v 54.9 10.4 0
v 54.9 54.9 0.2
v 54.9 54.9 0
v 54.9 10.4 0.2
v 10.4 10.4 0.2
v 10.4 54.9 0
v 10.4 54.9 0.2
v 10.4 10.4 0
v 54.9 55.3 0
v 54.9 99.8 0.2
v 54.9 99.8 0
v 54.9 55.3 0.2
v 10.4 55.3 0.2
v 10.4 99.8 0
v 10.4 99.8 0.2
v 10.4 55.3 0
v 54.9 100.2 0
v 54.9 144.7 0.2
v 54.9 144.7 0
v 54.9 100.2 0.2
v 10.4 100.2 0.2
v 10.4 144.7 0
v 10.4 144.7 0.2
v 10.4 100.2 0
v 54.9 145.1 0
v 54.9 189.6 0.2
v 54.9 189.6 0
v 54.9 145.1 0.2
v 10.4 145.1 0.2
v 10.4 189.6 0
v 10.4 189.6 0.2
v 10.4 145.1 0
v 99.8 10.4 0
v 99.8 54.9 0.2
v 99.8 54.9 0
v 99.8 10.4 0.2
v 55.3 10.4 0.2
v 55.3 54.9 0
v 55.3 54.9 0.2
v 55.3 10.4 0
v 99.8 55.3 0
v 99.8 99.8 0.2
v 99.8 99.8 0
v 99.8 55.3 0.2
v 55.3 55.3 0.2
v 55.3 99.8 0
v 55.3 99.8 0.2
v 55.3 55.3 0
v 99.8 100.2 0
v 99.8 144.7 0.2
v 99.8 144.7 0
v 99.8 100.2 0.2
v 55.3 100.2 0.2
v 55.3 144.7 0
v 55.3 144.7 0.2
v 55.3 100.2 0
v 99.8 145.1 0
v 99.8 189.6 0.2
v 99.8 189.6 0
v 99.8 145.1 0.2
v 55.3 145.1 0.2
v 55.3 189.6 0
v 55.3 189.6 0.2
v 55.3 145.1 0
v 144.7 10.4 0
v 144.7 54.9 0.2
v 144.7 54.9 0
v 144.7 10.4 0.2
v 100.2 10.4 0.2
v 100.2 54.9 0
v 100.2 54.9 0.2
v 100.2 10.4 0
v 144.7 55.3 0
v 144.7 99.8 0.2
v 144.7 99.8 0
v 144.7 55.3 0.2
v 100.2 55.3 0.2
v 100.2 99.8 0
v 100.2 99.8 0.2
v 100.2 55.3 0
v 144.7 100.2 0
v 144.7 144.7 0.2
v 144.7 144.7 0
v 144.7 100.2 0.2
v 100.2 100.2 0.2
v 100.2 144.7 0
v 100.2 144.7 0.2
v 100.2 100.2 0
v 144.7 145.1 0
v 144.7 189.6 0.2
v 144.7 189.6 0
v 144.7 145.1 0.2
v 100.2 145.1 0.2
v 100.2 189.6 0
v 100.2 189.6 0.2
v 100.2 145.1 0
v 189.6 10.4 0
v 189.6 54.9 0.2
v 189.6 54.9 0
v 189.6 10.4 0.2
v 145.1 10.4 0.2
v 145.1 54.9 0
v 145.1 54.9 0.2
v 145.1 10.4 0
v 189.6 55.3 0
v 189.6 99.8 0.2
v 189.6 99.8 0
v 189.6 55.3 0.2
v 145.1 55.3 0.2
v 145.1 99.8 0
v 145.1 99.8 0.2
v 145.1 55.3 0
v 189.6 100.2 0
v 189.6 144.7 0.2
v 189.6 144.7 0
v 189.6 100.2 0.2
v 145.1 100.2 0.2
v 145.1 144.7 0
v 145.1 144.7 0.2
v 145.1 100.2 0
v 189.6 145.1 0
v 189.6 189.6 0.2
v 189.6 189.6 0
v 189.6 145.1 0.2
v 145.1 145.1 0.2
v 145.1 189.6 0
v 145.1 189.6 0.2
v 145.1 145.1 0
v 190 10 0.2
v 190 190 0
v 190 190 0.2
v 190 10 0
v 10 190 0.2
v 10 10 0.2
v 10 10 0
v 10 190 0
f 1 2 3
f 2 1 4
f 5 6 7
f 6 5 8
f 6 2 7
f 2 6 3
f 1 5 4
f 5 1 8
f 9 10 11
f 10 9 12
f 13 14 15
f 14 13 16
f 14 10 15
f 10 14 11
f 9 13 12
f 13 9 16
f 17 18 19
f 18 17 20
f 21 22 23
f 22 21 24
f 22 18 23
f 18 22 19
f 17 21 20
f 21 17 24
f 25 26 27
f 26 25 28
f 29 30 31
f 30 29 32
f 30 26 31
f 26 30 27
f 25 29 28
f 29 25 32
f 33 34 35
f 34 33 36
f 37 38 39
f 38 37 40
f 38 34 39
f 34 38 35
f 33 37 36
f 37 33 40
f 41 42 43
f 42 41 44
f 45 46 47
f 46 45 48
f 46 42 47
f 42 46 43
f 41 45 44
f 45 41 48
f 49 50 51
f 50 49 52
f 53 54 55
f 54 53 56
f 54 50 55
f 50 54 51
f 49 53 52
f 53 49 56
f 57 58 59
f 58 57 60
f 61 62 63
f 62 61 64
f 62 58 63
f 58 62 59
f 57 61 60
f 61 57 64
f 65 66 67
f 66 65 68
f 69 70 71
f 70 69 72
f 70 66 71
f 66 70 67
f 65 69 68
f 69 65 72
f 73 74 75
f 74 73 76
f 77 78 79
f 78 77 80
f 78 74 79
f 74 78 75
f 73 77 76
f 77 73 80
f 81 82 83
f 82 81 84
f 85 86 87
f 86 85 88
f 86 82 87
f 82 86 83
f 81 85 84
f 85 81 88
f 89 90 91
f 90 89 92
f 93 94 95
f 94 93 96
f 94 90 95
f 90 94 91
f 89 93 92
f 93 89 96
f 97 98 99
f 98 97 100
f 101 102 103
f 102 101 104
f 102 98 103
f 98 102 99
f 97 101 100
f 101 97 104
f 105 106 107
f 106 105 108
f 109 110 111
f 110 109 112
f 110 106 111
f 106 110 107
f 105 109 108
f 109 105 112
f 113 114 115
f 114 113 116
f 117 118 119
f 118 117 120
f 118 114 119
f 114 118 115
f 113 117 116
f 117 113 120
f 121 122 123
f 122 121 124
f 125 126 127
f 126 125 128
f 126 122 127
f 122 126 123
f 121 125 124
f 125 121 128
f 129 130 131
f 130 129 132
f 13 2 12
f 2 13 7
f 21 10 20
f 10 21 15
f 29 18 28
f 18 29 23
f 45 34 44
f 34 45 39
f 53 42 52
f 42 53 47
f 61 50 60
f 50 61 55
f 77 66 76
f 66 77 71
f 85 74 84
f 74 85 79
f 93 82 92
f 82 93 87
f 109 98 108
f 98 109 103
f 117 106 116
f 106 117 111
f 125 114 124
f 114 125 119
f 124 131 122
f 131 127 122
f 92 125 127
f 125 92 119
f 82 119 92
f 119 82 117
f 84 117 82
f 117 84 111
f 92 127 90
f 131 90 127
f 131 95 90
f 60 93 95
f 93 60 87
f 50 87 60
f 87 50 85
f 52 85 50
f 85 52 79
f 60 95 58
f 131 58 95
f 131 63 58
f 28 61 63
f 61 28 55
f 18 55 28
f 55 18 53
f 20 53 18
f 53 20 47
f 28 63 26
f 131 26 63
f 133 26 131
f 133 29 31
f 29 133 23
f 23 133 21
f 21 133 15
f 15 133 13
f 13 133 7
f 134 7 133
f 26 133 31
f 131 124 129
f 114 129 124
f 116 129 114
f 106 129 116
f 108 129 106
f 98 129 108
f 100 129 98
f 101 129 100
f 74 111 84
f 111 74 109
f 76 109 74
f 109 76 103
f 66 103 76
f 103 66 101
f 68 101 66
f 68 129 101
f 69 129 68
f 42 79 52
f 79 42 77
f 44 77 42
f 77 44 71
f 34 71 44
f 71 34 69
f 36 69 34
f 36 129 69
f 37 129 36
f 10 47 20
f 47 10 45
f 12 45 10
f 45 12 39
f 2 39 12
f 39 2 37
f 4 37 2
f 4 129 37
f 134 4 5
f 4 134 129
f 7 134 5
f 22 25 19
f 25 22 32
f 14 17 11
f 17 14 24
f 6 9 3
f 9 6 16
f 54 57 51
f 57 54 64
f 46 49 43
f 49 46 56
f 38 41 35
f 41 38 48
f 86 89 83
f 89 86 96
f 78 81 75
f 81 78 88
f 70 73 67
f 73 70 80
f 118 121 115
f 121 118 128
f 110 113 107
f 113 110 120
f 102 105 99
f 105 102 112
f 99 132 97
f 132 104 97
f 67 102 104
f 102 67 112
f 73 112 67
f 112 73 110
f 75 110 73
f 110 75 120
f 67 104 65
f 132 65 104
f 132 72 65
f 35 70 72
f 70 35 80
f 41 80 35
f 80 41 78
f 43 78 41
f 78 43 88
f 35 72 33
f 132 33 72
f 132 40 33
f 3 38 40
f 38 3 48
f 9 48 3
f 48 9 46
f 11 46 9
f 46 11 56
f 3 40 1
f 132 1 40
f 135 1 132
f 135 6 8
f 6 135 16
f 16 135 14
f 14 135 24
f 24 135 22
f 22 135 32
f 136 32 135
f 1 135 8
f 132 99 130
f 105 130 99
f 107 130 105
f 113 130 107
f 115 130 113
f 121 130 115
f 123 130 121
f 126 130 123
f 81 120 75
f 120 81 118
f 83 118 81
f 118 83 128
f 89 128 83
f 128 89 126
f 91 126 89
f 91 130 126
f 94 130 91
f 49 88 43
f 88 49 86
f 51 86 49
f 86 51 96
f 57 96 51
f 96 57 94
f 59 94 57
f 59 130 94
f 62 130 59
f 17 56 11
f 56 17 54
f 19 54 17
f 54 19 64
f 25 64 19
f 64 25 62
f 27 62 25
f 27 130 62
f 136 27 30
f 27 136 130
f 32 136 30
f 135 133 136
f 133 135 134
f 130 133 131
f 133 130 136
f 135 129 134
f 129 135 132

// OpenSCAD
/*
 * Author: Amunak < https://www.thingiverse.com/amunak >
 * License: Creative Commons Attribution-ShareAlike (CC BY-SA 4.0) < https://creativecommons.org/licenses/by-sa/4.0/legalcode >
 * Thingiverse: thing:2742774 < https://www.thingiverse.com/thing:2742774 >
 * 
 * Printing note: unless you set a high enough margin print without skirt and brim!
 */

// Configuration:

//    bed size
//        self explanatory
bed_size = 200;

//    margins
//        gap between bed edges and the grid
margins = 10;

//    layer height
//        (aka the height you want the grid to print)
layer_height = 0.2;

//    line width
//        this should be your nozzle size (feel free to make it larger if you wish)
line_width = 0.4;

//    holes multiplier
//        number of "holes" in the grid in one dimension; for most cases 2 or 4 is ideal (even numbers meet at the center, odd numbers have a hole at the center; values under 1 don't really work and it should be a whole number)
holes_multiplier = 4;

// Advanced configuration
// Use when your X and Y sizes differ
x_size = bed_size;
y_size = bed_size;
x_margin = margins;
y_margin = margins;

// --------------------------------

// Checks:
// TODO: put assert() here instead
if (holes_multiplier < 1) {
    echo("Error: holes_multiplier must be at least 1!");
}
if (holes_multiplier != round(holes_multiplier)) {
    echo("Error: holes_multiplier must be a whole number!");
}
   
// Calculate base plate size
calc_x_size = x_size - (x_margin * 2);
calc_y_size = y_size - (y_margin * 2);

// Calculate size of each hole
calc_box_x_size = ((calc_x_size - line_width) / holes_multiplier) - (line_width);
calc_box_y_size = ((calc_y_size - line_width) / holes_multiplier) - (line_width);


// Create "base plate" and diff out individual "holes"/boxes
translate ([x_margin, y_margin, 0]) {
    difference() {
        cube([calc_x_size, calc_y_size, layer_height]);
    
        for(x = [0 : holes_multiplier-1]) {
            for(y = [0 : holes_multiplier-1]) {
                translate ([
                    (x * (line_width + calc_box_x_size)) + line_width,
                    (y * (line_width + calc_box_y_size)) + line_width,
                    -1
                ]) {
                    cube([calc_box_x_size, calc_box_y_size, layer_height+2]);
                }
            }
        }
    }
}
